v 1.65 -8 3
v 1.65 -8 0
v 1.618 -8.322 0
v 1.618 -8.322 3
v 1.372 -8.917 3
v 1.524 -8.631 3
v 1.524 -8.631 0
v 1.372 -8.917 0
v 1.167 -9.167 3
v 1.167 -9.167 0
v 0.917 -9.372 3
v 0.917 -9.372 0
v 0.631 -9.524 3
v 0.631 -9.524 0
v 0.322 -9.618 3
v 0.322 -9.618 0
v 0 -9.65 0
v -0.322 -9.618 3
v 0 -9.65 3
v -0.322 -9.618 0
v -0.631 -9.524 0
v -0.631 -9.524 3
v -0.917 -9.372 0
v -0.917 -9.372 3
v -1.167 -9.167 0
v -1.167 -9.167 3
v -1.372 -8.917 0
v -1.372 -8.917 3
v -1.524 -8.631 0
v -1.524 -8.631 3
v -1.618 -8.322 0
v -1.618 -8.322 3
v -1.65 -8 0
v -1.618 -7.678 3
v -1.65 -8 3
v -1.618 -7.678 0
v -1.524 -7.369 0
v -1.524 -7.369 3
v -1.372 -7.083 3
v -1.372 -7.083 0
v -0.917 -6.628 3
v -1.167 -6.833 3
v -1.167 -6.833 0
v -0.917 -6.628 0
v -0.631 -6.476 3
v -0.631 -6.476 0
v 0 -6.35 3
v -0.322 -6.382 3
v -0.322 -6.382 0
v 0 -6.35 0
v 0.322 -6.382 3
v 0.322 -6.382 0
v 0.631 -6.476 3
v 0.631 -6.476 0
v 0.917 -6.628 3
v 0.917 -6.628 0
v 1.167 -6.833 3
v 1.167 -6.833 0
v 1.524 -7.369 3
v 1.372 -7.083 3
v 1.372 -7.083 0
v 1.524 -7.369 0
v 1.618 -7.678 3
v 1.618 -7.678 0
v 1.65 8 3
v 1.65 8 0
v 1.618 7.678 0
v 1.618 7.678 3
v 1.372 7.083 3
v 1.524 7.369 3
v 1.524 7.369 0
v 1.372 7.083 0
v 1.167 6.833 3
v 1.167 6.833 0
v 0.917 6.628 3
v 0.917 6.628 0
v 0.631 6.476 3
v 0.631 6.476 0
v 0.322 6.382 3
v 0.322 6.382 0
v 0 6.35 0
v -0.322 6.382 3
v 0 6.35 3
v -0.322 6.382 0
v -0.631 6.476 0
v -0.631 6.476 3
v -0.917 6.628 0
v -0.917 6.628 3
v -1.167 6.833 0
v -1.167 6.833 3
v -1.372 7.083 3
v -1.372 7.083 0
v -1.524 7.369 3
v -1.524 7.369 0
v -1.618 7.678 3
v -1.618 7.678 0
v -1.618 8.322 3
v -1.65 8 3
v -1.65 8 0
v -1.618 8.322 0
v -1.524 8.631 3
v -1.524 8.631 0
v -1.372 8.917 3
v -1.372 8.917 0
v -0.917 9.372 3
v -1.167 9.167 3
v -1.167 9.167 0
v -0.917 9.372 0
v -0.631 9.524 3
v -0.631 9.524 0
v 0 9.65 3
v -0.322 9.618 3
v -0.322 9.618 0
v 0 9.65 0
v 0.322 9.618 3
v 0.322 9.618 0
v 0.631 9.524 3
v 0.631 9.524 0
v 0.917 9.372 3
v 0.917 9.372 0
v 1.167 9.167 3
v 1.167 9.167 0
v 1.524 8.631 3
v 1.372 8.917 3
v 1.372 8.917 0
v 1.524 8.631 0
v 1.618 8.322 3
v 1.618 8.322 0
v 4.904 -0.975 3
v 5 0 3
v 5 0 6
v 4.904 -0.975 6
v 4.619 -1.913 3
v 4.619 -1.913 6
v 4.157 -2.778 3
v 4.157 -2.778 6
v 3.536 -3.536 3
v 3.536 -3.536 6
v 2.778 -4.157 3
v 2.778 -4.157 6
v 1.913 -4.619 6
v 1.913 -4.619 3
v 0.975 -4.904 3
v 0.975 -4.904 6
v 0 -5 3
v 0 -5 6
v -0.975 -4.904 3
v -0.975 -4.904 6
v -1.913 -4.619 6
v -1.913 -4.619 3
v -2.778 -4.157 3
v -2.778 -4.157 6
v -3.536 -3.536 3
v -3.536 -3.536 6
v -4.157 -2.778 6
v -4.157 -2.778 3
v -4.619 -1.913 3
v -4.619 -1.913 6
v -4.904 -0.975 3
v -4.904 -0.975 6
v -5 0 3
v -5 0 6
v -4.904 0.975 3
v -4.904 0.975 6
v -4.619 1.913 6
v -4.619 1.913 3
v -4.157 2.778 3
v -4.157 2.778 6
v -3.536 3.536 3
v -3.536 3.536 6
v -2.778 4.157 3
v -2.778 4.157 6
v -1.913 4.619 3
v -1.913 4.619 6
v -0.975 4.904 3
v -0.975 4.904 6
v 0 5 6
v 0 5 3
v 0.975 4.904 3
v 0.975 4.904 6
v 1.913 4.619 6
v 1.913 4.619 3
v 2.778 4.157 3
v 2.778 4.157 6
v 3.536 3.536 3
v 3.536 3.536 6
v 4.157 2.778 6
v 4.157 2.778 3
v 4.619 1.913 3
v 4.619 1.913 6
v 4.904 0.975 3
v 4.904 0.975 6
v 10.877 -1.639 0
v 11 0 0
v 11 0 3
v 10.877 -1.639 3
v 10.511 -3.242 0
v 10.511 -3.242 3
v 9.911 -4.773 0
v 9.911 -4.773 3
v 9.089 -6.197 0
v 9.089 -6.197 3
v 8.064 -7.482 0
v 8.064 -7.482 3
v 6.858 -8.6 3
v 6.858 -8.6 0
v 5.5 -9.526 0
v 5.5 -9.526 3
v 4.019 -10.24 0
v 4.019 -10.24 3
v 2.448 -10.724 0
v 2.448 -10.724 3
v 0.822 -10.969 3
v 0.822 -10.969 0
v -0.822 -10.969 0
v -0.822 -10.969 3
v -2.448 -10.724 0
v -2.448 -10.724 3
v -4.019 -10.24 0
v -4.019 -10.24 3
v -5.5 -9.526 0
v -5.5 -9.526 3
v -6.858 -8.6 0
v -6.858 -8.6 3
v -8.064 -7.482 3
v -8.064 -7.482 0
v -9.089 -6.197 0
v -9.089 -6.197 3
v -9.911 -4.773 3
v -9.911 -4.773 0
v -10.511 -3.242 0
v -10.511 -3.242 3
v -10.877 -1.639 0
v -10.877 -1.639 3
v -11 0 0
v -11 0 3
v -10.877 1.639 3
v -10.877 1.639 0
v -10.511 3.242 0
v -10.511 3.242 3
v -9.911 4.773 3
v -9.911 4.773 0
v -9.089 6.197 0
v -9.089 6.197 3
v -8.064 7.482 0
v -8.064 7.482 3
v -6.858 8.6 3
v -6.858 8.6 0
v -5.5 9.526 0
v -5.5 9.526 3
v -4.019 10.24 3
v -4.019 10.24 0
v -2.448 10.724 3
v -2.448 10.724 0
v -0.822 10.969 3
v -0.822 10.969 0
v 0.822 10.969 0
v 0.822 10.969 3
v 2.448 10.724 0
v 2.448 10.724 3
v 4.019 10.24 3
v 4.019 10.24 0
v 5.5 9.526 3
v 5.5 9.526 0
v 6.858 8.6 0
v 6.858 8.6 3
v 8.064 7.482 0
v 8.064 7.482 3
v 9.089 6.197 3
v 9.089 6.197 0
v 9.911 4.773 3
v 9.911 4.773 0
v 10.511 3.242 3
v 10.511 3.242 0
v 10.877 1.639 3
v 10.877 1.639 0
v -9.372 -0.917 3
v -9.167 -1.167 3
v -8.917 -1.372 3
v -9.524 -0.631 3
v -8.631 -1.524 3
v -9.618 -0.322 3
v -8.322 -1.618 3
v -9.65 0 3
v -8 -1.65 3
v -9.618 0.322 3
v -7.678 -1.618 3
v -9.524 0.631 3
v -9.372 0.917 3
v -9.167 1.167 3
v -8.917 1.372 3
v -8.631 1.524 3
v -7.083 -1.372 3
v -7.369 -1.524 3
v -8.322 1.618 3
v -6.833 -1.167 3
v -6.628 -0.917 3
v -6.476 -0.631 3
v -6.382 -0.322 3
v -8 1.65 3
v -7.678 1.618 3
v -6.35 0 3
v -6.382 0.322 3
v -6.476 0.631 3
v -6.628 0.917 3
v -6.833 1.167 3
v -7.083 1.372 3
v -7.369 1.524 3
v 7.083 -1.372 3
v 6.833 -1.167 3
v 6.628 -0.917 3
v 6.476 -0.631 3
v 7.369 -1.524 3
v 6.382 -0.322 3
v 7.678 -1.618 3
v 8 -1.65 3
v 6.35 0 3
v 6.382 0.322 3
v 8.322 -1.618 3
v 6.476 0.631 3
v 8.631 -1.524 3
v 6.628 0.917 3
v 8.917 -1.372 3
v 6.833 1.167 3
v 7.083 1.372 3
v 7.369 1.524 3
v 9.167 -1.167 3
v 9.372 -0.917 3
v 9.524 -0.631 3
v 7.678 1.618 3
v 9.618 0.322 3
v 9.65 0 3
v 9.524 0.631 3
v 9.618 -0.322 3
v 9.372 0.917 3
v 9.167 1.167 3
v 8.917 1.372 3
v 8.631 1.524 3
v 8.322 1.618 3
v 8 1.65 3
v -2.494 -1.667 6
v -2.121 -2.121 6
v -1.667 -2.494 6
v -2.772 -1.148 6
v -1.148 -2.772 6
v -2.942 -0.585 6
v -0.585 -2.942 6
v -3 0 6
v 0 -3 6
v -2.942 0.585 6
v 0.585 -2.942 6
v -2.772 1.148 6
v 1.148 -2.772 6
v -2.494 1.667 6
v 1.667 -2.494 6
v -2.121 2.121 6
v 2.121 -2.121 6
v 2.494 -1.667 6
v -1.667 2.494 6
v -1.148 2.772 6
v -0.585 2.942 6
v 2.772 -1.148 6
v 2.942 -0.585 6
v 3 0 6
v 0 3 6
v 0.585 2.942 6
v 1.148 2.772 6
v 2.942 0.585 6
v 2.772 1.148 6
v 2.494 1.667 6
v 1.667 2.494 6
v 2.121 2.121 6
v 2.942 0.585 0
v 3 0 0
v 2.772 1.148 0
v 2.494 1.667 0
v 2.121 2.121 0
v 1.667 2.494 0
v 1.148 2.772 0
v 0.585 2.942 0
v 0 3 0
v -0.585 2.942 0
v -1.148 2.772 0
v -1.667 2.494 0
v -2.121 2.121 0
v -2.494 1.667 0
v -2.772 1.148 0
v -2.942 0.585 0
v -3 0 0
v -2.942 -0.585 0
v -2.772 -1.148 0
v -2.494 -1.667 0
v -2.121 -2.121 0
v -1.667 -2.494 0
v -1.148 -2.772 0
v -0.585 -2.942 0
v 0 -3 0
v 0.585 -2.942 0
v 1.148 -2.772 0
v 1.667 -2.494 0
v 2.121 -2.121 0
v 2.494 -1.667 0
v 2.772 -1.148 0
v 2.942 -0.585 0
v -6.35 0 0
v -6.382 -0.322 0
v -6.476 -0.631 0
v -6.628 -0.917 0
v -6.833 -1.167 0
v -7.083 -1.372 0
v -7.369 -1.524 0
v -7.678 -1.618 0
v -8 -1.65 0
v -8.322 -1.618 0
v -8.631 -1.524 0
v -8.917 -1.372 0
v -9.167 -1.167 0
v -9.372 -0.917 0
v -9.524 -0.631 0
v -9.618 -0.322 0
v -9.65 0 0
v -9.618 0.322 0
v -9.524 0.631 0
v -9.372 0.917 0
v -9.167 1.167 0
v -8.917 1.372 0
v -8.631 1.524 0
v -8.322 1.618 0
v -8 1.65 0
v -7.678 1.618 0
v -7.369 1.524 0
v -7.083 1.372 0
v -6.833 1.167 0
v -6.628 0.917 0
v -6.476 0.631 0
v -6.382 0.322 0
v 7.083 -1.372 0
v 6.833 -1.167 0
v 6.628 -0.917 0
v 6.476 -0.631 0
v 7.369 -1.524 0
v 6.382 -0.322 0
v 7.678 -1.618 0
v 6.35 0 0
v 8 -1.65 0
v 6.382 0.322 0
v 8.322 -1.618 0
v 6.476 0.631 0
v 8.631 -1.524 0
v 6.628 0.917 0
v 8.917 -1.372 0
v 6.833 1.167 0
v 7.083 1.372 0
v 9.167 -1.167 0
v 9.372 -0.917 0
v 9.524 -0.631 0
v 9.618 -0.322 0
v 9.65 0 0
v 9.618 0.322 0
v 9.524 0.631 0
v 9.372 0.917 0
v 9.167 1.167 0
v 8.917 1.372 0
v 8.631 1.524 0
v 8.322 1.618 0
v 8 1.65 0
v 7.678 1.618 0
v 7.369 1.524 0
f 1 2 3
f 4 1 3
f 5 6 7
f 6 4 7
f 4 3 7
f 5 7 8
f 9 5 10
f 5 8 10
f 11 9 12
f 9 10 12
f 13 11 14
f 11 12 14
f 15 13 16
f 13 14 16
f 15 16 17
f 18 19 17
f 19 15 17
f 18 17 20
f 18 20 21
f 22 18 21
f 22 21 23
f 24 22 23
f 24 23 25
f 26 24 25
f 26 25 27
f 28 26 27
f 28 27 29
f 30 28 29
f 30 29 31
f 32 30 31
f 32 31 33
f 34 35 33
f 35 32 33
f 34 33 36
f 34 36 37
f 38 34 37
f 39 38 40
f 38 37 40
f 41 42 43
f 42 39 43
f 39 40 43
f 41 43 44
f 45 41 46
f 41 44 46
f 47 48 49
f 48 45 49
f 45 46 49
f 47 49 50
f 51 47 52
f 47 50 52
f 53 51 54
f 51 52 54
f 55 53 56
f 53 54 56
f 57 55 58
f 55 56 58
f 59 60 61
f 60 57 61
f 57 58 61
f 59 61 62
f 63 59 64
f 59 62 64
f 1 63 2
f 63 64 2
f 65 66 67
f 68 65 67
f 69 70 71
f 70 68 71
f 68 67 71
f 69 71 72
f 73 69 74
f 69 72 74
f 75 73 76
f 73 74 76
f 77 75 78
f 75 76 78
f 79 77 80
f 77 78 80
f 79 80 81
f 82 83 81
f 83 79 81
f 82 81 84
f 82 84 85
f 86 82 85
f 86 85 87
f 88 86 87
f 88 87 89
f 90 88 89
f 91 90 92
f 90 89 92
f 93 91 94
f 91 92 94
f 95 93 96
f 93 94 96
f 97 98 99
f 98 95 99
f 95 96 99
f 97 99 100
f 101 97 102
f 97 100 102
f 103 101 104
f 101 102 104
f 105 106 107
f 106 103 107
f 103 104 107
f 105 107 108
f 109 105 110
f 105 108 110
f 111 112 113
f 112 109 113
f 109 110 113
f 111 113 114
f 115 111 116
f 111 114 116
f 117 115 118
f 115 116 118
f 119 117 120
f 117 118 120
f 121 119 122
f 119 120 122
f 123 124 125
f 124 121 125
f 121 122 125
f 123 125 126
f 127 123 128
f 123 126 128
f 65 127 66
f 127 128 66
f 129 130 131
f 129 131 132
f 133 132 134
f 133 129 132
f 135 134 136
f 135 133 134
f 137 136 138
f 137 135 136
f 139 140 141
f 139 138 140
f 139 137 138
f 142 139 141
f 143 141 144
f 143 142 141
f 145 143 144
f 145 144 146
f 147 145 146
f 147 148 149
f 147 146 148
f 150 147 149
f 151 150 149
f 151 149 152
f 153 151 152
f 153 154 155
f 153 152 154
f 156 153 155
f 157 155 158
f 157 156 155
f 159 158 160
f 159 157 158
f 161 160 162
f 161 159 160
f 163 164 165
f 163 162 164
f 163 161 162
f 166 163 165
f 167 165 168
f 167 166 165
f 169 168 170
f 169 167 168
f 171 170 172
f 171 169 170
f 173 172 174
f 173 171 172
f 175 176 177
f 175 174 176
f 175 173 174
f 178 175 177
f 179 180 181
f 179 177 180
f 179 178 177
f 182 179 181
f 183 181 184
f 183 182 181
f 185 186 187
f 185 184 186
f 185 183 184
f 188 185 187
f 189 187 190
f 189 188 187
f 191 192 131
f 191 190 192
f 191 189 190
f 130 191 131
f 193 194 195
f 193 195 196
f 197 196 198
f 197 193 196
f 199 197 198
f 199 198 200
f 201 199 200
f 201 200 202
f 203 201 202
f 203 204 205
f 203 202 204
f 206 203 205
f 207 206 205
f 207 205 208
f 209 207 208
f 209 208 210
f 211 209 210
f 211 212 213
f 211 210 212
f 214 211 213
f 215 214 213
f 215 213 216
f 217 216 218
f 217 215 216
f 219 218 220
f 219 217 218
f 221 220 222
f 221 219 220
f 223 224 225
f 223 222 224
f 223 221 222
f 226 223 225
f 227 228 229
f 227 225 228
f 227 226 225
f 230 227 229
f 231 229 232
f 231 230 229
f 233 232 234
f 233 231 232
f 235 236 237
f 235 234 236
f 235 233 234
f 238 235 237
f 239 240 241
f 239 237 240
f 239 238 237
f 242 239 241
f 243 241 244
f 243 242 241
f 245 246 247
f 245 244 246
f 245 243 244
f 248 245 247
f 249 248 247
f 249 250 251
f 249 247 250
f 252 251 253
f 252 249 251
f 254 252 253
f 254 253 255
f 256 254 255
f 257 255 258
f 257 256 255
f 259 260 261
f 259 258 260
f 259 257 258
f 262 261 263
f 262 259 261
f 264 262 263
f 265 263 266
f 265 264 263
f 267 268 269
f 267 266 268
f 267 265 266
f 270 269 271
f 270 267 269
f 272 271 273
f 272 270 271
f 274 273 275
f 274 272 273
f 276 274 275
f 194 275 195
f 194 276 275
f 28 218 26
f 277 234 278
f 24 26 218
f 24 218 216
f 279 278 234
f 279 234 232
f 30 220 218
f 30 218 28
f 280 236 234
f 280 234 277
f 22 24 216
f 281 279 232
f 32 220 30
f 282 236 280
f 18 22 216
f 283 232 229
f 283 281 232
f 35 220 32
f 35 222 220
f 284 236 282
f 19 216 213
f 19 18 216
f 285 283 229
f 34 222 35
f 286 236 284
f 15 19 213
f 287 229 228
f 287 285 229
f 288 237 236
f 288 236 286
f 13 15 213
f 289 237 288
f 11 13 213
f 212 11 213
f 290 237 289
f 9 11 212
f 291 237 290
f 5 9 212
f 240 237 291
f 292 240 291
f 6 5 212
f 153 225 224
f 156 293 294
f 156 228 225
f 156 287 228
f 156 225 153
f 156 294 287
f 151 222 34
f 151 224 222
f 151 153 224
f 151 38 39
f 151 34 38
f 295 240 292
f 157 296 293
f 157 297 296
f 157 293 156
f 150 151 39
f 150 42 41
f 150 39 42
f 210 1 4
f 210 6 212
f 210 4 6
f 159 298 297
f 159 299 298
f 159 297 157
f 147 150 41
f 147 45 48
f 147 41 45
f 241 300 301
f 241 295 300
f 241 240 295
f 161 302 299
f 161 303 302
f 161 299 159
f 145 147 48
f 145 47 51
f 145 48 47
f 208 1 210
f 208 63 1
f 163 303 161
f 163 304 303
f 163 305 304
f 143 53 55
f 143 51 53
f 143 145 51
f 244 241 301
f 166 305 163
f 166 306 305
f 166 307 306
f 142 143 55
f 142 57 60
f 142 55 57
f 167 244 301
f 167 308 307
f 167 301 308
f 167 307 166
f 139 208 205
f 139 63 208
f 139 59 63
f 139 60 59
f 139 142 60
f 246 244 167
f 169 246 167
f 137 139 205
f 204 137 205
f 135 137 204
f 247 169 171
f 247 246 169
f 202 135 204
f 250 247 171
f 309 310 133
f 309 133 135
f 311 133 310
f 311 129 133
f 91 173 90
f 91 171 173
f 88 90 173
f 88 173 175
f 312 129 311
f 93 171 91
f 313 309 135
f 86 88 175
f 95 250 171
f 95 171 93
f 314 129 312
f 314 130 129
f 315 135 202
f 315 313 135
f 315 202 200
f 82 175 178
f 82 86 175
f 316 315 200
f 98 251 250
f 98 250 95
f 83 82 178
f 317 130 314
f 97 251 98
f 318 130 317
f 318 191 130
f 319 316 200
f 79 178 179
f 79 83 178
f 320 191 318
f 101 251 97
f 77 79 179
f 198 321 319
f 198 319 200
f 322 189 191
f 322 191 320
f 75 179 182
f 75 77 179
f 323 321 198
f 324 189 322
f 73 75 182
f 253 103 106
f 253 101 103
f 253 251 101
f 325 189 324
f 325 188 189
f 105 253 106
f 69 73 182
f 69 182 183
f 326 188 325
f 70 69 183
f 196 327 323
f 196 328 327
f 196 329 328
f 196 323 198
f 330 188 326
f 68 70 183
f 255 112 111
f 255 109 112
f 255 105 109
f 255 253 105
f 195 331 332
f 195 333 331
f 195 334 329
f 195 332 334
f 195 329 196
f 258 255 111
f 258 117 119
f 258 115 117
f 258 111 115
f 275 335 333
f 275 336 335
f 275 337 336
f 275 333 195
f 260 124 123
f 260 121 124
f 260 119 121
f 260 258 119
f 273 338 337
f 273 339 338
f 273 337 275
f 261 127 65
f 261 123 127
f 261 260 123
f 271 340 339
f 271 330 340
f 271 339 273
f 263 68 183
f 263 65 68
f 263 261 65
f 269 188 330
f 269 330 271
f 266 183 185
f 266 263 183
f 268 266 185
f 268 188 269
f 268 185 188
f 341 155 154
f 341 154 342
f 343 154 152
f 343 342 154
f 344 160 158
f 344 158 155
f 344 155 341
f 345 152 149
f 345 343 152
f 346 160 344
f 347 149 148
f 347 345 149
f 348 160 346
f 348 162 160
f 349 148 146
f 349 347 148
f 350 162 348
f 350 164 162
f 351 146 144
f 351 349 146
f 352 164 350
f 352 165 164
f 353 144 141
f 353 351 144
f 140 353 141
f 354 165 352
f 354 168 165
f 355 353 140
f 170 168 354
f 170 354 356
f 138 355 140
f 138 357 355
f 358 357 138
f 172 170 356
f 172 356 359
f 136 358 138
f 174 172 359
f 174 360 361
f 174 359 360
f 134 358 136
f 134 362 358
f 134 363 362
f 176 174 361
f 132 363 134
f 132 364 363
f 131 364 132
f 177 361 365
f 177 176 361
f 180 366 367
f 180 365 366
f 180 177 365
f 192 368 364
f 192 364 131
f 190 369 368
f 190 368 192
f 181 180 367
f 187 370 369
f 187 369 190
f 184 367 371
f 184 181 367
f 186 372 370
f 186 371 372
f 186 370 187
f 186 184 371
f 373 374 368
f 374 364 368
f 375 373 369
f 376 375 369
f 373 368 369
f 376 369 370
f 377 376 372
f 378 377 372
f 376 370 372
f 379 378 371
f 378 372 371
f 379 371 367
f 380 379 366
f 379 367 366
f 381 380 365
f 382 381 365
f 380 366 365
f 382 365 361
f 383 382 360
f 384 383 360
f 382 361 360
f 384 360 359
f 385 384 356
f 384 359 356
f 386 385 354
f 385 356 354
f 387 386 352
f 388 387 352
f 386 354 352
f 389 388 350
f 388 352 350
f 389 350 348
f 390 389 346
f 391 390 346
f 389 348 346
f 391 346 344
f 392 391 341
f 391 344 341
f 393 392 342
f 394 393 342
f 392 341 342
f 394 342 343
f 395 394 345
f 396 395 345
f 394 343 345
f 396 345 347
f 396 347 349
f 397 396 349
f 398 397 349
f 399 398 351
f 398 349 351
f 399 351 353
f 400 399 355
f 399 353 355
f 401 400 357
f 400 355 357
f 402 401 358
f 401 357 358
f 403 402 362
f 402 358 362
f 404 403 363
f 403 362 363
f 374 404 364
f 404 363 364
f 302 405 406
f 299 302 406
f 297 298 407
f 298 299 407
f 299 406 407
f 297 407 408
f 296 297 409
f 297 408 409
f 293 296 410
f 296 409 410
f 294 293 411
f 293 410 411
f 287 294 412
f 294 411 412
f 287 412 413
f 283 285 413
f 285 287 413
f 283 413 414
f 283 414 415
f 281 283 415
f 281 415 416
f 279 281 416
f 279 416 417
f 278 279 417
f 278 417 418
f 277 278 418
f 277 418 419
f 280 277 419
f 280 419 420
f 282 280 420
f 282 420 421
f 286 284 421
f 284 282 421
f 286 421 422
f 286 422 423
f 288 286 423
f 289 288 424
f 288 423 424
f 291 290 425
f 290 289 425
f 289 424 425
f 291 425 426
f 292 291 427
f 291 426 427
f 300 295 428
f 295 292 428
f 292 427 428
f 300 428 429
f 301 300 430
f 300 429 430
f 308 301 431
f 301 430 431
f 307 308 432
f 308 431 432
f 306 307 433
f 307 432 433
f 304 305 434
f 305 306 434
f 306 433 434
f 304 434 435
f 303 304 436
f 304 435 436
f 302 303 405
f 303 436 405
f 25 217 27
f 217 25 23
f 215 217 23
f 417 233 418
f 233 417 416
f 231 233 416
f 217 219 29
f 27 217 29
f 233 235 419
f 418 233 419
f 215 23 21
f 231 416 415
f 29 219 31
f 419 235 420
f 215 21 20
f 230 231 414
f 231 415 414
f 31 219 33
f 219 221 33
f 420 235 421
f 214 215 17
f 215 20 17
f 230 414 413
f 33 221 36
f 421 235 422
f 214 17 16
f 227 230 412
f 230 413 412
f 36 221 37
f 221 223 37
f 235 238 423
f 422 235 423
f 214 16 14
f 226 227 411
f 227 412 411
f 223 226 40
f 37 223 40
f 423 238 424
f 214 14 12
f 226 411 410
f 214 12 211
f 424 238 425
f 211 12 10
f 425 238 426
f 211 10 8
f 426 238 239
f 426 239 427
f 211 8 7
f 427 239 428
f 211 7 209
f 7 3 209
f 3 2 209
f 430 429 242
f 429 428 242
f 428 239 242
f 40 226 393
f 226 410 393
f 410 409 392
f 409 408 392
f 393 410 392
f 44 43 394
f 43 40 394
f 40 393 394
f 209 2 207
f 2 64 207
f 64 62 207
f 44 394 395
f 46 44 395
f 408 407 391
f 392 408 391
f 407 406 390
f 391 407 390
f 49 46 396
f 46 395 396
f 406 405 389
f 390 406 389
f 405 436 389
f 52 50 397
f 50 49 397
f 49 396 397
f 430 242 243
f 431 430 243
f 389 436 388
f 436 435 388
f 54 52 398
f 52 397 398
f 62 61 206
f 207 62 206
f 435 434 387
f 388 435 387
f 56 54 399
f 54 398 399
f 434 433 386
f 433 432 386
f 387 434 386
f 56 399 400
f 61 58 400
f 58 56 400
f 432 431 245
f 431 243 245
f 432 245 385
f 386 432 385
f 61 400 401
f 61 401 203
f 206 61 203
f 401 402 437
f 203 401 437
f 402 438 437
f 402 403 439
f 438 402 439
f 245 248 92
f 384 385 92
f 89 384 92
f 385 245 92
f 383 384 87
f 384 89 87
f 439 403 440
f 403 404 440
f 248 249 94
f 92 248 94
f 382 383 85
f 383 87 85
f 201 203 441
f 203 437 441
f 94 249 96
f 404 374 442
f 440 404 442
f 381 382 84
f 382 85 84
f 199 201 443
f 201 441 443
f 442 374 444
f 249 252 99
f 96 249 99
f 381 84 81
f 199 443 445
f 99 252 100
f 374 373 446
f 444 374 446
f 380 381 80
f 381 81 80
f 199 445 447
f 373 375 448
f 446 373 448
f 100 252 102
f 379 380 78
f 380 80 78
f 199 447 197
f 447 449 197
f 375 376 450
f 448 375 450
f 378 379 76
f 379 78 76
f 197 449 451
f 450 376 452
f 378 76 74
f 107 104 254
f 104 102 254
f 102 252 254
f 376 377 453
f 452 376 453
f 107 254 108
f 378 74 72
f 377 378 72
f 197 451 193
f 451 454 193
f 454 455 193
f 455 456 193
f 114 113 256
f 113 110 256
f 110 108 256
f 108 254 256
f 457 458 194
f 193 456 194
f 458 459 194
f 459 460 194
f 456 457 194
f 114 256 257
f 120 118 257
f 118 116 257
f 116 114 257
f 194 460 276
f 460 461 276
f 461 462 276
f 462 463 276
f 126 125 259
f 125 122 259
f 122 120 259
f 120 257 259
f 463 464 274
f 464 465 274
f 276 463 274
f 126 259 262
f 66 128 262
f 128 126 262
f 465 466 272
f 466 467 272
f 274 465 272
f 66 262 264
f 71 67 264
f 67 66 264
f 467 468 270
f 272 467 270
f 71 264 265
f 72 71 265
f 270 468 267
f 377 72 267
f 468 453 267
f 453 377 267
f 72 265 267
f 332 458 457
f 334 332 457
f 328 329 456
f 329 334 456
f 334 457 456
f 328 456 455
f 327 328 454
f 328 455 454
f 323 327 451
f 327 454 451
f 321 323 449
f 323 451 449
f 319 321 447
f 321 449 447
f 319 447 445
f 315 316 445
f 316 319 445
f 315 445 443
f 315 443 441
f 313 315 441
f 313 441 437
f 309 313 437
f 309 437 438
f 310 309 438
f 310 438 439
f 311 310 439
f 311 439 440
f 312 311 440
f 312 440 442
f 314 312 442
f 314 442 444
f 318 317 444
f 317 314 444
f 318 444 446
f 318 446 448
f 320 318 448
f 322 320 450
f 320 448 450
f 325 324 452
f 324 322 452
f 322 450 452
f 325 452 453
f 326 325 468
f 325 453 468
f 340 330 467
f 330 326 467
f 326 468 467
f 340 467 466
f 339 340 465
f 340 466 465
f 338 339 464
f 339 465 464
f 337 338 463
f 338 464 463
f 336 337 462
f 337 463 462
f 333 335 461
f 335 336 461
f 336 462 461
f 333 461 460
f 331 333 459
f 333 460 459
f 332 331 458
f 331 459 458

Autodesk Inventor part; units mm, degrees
ref_plane "YZ Plane" through (0, 0, 0) normal (1, 0, 0) x (0, 1, 0)
ref_plane "XZ Plane" through (0, 0, 0) normal (0, 1, 0) x (-1, 0, 0)
ref_plane "XY Plane" through (0, 0, 0) normal (0, 0, 1) x (1, 0, 0)
sketch "Sketch1" plane through (0, 0, 0) normal (0, 0, 1) x (1, 0, 0)
  circle A0 centre (0, 0) radius 11
  circle A1 centre (0, 8) radius 1.65
  line L0 (-3.4226, 0) -> (4.8397, 0) construction
  line L1 (0, 0) -> (0, 2.4255) construction
  circle A2 centre (8, 0) radius 1.65
  circle A3 centre (0, -8) radius 1.65
  circle A4 centre (-8, 0) radius 1.65
  dimension "d0" = 22
  dimension "d1" = 8
  dimension "d2" = 3.3
  dimension "d3" = 8
  dimension "d4" = 3.3
extrude "Extrusion1" add sketch "Sketch1" along normal blind 3
sketch "Sketch2" plane through (0, 0, 3) normal (0, 0, 1) x (1, 0, 0)
  circle A0 centre (0, 0) radius 5
  dimension "d7" = 10
extrude "Extrusion2" add sketch "Sketch2" along normal blind 3
sketch "Sketch3" plane through (0, 0, 6) normal (0, 0, 1) x (1, 0, 0)
  circle A0 centre (0, 0) radius 3
  dimension "d10" = 6
extrude "Extrusion3" cut sketch "Sketch3" against normal through all
equation "\"d3\" = d1"
equation "\"d4\" = d2"
properties part number "Acople" material "ABS Plastic"
